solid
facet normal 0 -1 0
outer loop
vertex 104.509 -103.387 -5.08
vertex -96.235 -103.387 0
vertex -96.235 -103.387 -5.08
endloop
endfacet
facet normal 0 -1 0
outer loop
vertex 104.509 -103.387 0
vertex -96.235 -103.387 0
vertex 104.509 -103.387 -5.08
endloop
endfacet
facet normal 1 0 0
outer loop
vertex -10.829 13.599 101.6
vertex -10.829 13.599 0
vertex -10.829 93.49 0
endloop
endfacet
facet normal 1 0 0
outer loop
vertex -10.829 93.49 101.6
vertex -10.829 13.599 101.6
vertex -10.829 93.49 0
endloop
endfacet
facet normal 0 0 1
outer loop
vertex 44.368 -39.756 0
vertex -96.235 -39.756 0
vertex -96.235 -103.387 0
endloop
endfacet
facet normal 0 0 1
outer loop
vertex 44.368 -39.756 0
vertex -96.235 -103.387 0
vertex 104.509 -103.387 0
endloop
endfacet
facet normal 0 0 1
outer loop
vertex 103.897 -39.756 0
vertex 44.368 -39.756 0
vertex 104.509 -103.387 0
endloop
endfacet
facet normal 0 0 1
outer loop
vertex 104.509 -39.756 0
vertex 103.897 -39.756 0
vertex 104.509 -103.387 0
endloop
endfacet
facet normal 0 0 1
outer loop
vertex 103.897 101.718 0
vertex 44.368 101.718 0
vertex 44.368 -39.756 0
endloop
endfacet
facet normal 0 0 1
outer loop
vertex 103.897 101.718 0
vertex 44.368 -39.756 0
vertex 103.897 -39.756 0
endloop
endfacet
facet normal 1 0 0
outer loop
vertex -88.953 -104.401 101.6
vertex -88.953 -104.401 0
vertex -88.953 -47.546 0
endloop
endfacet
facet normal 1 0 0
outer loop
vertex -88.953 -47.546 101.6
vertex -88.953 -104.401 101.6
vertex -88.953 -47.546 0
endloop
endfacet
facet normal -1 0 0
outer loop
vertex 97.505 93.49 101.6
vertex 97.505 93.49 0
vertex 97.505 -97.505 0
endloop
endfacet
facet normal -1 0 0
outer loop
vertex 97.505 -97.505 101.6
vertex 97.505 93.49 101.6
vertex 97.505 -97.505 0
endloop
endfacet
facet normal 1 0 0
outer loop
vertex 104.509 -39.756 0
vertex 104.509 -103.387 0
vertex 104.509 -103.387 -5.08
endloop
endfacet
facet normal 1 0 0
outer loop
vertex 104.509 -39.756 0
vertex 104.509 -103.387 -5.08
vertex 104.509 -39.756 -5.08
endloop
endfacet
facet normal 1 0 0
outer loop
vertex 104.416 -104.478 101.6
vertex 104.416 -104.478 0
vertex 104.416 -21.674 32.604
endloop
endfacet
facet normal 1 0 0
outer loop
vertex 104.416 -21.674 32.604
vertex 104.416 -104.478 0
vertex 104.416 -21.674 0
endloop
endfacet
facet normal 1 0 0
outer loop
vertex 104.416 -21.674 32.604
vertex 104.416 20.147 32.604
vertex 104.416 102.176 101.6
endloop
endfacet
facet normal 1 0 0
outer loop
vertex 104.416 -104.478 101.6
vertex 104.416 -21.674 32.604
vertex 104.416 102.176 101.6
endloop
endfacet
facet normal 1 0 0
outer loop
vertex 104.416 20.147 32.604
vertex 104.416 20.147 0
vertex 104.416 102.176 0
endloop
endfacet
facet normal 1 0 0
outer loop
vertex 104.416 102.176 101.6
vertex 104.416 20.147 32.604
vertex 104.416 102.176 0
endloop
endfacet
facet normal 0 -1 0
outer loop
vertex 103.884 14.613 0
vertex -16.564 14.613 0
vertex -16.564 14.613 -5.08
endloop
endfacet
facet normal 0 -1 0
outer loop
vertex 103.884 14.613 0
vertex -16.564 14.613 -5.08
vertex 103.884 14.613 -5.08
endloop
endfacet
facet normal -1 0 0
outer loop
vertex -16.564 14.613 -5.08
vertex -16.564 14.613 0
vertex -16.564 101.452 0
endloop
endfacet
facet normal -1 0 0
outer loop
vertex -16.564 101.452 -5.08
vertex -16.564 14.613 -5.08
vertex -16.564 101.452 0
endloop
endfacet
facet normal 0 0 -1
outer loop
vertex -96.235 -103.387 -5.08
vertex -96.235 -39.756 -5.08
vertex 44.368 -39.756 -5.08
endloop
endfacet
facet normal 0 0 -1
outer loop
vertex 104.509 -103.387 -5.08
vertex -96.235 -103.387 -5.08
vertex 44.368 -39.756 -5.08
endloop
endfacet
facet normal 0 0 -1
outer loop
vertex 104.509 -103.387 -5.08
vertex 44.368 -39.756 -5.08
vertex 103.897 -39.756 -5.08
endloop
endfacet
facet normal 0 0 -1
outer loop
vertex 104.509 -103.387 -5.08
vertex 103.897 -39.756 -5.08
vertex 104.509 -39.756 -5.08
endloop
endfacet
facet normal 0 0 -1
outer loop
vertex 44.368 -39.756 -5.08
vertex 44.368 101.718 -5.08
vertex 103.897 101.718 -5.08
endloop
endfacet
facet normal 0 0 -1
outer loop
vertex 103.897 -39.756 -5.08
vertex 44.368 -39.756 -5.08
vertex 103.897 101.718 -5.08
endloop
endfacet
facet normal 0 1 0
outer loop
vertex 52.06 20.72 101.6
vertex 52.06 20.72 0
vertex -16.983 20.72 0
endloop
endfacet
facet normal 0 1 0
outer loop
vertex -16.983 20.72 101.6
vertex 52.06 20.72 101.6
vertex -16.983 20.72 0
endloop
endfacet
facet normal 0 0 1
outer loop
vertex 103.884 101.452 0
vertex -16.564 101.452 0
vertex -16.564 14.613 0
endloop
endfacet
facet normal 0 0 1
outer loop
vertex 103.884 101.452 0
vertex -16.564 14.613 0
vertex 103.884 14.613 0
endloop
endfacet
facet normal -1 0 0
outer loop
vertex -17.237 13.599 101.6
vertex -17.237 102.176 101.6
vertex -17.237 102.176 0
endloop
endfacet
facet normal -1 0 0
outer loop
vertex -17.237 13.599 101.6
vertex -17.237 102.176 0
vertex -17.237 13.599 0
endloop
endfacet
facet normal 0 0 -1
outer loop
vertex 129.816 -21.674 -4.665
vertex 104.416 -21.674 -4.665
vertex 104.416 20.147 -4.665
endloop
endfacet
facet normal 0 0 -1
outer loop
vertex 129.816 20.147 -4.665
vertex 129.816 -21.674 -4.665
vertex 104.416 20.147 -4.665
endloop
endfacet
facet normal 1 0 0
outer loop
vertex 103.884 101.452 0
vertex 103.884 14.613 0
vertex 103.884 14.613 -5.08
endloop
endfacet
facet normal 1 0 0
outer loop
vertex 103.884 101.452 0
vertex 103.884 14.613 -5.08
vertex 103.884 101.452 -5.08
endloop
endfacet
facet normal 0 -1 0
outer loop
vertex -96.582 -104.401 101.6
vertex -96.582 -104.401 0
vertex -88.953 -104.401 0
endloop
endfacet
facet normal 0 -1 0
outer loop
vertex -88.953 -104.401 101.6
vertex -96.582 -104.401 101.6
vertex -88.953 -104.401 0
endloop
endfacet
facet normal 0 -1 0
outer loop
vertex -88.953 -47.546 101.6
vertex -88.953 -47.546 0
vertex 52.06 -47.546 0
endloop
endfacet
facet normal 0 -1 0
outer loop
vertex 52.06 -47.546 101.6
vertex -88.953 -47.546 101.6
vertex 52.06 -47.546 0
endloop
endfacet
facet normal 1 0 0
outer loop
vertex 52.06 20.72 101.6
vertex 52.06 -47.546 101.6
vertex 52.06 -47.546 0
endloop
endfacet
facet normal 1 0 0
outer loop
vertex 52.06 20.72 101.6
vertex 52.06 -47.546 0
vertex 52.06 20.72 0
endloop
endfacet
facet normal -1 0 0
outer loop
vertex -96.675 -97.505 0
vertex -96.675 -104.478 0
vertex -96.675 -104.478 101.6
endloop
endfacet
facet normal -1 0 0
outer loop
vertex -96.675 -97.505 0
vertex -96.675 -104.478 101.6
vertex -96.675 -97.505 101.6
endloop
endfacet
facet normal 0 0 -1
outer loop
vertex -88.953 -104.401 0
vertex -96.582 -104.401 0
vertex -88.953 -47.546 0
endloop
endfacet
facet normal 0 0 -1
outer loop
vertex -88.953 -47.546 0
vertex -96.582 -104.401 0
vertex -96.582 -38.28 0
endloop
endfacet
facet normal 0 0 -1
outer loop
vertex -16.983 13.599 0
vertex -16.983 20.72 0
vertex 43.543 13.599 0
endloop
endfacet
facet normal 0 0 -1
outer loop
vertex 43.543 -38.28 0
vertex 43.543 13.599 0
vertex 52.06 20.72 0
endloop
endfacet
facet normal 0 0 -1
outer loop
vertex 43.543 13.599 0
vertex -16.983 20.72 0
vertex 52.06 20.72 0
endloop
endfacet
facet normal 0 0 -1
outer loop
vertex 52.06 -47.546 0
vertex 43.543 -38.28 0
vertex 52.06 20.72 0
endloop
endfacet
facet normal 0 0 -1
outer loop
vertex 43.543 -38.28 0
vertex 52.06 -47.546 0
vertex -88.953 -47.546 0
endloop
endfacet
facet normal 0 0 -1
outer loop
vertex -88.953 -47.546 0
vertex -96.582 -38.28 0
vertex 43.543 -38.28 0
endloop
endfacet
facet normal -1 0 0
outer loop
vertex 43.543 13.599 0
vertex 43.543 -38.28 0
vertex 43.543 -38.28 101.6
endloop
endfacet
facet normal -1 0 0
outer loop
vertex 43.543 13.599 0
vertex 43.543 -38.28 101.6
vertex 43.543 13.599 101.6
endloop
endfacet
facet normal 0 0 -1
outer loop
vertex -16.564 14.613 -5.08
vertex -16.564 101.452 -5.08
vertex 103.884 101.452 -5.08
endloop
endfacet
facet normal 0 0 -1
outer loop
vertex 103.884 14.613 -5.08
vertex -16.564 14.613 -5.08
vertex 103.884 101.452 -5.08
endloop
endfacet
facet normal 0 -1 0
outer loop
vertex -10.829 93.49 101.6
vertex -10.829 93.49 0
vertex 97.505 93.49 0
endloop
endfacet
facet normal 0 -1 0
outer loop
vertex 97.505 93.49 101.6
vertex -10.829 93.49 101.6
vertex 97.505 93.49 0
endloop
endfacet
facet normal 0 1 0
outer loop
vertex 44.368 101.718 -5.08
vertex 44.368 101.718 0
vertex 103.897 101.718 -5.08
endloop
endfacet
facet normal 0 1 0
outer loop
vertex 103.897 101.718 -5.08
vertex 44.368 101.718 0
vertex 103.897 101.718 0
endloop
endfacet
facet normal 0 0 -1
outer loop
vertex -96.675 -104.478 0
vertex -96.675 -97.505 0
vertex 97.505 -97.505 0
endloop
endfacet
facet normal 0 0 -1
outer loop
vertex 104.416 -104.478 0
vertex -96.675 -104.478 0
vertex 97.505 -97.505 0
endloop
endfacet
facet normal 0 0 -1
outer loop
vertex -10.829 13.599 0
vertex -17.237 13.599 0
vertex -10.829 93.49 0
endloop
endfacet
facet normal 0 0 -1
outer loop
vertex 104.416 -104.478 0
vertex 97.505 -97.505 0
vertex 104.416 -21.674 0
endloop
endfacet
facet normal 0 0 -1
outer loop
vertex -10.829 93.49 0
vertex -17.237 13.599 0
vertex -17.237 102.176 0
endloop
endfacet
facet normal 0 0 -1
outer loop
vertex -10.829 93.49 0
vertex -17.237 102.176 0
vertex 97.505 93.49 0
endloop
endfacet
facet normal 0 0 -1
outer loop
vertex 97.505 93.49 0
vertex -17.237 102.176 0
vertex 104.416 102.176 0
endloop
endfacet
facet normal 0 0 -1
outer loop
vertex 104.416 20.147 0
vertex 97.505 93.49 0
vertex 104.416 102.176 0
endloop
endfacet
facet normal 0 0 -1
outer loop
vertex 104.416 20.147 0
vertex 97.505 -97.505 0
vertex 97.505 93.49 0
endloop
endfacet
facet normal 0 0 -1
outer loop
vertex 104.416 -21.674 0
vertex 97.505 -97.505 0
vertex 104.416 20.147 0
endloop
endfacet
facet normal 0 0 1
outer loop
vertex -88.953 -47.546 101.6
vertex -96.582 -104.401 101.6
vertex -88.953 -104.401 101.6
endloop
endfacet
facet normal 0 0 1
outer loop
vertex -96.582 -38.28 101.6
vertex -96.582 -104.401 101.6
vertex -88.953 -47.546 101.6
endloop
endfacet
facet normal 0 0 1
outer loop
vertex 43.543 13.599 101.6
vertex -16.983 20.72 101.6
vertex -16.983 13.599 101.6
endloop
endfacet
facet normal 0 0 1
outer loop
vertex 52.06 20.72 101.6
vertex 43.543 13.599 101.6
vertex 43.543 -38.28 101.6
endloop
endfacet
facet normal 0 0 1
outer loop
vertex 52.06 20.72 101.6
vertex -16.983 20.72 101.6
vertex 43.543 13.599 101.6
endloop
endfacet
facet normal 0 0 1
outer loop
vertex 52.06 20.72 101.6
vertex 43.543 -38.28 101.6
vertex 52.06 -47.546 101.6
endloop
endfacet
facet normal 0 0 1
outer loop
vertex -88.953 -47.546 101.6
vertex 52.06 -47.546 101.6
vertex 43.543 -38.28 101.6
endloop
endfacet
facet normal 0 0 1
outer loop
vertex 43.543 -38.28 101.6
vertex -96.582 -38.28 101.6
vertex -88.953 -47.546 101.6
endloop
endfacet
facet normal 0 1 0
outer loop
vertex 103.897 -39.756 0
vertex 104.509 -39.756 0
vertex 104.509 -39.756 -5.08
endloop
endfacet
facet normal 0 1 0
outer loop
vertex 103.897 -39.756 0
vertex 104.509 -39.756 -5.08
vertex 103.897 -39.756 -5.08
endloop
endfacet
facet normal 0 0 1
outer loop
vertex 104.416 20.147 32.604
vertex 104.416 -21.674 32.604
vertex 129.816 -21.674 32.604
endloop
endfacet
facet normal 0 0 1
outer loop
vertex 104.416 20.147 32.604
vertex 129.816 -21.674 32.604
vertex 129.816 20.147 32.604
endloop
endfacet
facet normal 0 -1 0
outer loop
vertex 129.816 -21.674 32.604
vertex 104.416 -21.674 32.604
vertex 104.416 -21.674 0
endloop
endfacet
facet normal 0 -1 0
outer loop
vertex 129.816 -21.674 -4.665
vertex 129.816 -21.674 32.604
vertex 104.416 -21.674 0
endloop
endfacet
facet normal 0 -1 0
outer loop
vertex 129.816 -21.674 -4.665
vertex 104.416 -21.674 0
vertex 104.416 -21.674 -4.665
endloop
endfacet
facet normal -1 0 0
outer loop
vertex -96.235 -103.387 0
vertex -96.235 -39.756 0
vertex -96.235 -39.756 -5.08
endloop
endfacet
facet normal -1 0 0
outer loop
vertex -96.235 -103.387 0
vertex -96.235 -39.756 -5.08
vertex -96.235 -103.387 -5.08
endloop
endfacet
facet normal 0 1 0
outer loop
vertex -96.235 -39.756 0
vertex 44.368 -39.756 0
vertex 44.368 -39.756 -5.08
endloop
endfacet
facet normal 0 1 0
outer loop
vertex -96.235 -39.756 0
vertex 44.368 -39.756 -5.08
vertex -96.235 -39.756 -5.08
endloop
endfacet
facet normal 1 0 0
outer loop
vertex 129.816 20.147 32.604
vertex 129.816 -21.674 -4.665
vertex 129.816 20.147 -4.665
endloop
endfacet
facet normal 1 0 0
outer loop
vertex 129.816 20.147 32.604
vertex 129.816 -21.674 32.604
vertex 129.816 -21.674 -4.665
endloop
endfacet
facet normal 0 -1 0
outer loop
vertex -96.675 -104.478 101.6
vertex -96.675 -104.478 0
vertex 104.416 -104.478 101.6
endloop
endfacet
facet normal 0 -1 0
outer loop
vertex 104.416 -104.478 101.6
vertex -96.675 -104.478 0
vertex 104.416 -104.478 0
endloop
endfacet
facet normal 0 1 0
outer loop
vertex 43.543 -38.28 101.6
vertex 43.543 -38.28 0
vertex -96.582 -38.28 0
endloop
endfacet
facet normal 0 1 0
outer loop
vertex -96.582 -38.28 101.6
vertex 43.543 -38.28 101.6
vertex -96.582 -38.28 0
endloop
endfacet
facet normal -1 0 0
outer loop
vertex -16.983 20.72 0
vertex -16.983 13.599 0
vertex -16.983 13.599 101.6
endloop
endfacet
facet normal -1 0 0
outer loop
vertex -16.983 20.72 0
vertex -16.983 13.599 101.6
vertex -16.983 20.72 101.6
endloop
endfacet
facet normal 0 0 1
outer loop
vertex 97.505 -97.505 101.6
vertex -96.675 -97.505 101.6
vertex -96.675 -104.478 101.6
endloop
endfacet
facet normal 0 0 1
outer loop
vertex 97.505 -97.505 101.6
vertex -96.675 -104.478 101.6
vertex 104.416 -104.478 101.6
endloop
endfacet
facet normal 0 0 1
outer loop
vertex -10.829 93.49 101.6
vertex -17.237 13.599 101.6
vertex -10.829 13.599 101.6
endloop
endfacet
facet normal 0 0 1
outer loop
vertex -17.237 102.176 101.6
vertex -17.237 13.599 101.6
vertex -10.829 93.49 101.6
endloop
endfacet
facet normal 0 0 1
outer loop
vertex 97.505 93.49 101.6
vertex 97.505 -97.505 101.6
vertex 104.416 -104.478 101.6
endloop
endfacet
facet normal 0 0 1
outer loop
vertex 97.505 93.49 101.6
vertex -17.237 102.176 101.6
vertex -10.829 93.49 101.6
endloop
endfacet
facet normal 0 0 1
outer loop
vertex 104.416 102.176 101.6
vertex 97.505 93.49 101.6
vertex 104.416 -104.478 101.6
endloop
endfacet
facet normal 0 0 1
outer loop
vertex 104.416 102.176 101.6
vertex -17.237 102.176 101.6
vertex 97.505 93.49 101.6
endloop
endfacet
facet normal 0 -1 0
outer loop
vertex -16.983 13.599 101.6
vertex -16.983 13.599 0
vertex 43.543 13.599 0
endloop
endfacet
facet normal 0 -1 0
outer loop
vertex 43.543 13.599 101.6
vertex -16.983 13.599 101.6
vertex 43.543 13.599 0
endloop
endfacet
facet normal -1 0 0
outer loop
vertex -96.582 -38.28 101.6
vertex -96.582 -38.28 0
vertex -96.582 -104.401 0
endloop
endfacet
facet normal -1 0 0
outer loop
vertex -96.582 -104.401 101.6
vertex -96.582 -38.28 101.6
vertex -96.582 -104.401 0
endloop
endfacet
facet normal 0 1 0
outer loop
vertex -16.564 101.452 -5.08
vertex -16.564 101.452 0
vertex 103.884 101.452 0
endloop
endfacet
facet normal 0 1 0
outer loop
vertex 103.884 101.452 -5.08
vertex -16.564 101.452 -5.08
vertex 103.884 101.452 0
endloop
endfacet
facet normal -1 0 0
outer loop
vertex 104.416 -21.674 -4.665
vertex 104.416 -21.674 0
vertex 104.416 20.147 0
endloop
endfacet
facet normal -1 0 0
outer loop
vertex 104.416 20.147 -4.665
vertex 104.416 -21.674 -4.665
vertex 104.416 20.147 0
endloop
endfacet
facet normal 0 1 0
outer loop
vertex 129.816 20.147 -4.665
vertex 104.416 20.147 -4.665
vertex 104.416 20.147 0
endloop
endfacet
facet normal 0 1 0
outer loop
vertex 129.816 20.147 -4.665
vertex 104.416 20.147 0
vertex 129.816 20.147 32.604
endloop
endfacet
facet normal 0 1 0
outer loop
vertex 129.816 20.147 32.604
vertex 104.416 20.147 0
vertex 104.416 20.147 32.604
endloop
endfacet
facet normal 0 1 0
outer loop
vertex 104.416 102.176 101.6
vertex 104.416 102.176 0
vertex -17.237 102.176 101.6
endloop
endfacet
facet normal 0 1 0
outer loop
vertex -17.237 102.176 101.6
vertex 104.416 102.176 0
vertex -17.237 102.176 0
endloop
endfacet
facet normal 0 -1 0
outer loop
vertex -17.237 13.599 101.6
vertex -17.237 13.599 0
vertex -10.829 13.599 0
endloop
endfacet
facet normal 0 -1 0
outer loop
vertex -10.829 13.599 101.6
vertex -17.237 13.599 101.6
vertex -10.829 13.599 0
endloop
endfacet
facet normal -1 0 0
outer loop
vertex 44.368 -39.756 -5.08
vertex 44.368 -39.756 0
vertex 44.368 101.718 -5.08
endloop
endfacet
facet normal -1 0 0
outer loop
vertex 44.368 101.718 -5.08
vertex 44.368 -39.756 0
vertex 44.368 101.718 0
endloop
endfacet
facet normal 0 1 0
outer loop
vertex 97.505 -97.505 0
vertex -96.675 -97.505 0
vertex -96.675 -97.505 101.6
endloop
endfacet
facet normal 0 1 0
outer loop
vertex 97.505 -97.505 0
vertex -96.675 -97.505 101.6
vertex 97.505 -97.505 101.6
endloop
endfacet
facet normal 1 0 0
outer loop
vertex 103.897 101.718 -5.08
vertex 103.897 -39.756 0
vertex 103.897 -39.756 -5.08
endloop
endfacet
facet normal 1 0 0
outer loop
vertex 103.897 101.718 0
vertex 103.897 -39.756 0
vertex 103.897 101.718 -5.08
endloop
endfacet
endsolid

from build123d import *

# Parameters (mm, degrees)
F0_W     = 6.9115534425
F0_H     = 8.6863413453
F0_W_2   = 194.1798776388
F0_H_2   = 6.973400712
F0_W_3   = 108.334004879
F2_DEPTH = 101.6
F1_W     = 7.6293349266
F1_H     = 56.8553954363
F1_W_2   = 132.4961185455
F1_H_2   = 9.2654973269
F1_W_3   = 8.5166245699
F1_H_3   = 51.87946558
F1_W_4   = 60.5260580778
F1_H_4   = 7.1207135916
F3_W     = 59.5295839012
F3_H     = 141.4737850428
F5_DEPTH = 5.08
F4_W     = 120.4475797713
F4_H     = 86.8390146643
F6_W     = 41.8207272887
F6_H     = 4.665106535
F6_H_2   = 32.6037108898
F7_DEPTH = 25.4


with BuildPart() as f2:
    # F0 (on Top) → F2 (new body)
    with BuildSketch(Plane.XY):
        with Locations((100.9606011212, 97.8332646191)):
            Rectangle(F0_W, F0_H)
        Polygon((97.5048243999, 93.4900939465), (97.5048243999, -97.5048393011), (97.5048243999, -104.4782400131), (104.4163778424, -104.4782400131), (104.4163778424, 93.4900939465), align=None)
        with Locations((0.4148855805, -100.9915396571)):
            Rectangle(F0_W_2, F0_H_2)
        Polygon((-10.829180479, 13.5991275311), (-10.829180479, 93.4900939465), (-10.829180479, 102.1764352918), (-17.2371268272, 102.1764352918), (-17.2371268272, 13.5991275311), align=None)
        with Locations((43.3378219604, 97.8332646191)):
            Rectangle(F0_W_3, F0_H)
    extrude(amount=F2_DEPTH)

    # F6 (on face) → F7 (join)
    with BuildSketch(Plane.YZ.offset(104.4163778424)):
        with Locations((-0.7636211812, -2.3325532675)):
            Rectangle(F6_W, F6_H)
        with Locations((-0.7636211812, 16.3018554449)):
            Rectangle(F6_W, F6_H_2)
    extrude(amount=F7_DEPTH)


with BuildPart() as f2b:
    # F1 (on Top) → F2, piece 2 (new body)
    with BuildSketch(Plane.XY):
        with Locations((-92.7675515413, -75.9735181928)):
            Rectangle(F1_W, F1_H)
        with Locations((-22.7048248053, -42.9130718112)):
            Rectangle(F1_W_2, F1_H_2)
        with Locations((-92.7675515413, -42.9130718112)):
            Rectangle(F1_W, F1_H_2)
        with Locations((47.8015467525, -12.3405903578)):
            Rectangle(F1_W_3, F1_H_3)
        with Locations((47.8015467525, -42.9130718112)):
            Rectangle(F1_W_3, F1_H_2)
        with Locations((13.2802054286, 17.159499228)):
            Rectangle(F1_W_4, F1_H_4)
        with Locations((47.8015467525, 17.159499228)):
            Rectangle(F1_W_3, F1_H_4)
    extrude(amount=F2_DEPTH)


with BuildPart() as f5:
    # F3 (on Top) → F5 (new body)
    with BuildSketch(Plane.XY):
        with Locations((74.1324219853, 30.9812948108)):
            Rectangle(F3_W, F3_H)
        Polygon((-96.2352901697, -39.7555977106), (-96.2352901697, -103.386759758), (104.5090258121, -103.386759758), (104.5090258121, -39.7555977106), (103.8972139359, -39.7555977106), (44.3676300347, -39.7555977106), align=None)
    extrude(amount=-F5_DEPTH)


with BuildPart() as f5b:
    # F4 (on Top) → F5, piece 2 (new body)
    with BuildSketch(Plane.XY):
        with Locations((43.6597149819, 58.0327985808)):
            Rectangle(F4_W, F4_H)
    extrude(amount=-F5_DEPTH)


solid = Compound([f2.part, f2b.part, f5.part, f5b.part])
